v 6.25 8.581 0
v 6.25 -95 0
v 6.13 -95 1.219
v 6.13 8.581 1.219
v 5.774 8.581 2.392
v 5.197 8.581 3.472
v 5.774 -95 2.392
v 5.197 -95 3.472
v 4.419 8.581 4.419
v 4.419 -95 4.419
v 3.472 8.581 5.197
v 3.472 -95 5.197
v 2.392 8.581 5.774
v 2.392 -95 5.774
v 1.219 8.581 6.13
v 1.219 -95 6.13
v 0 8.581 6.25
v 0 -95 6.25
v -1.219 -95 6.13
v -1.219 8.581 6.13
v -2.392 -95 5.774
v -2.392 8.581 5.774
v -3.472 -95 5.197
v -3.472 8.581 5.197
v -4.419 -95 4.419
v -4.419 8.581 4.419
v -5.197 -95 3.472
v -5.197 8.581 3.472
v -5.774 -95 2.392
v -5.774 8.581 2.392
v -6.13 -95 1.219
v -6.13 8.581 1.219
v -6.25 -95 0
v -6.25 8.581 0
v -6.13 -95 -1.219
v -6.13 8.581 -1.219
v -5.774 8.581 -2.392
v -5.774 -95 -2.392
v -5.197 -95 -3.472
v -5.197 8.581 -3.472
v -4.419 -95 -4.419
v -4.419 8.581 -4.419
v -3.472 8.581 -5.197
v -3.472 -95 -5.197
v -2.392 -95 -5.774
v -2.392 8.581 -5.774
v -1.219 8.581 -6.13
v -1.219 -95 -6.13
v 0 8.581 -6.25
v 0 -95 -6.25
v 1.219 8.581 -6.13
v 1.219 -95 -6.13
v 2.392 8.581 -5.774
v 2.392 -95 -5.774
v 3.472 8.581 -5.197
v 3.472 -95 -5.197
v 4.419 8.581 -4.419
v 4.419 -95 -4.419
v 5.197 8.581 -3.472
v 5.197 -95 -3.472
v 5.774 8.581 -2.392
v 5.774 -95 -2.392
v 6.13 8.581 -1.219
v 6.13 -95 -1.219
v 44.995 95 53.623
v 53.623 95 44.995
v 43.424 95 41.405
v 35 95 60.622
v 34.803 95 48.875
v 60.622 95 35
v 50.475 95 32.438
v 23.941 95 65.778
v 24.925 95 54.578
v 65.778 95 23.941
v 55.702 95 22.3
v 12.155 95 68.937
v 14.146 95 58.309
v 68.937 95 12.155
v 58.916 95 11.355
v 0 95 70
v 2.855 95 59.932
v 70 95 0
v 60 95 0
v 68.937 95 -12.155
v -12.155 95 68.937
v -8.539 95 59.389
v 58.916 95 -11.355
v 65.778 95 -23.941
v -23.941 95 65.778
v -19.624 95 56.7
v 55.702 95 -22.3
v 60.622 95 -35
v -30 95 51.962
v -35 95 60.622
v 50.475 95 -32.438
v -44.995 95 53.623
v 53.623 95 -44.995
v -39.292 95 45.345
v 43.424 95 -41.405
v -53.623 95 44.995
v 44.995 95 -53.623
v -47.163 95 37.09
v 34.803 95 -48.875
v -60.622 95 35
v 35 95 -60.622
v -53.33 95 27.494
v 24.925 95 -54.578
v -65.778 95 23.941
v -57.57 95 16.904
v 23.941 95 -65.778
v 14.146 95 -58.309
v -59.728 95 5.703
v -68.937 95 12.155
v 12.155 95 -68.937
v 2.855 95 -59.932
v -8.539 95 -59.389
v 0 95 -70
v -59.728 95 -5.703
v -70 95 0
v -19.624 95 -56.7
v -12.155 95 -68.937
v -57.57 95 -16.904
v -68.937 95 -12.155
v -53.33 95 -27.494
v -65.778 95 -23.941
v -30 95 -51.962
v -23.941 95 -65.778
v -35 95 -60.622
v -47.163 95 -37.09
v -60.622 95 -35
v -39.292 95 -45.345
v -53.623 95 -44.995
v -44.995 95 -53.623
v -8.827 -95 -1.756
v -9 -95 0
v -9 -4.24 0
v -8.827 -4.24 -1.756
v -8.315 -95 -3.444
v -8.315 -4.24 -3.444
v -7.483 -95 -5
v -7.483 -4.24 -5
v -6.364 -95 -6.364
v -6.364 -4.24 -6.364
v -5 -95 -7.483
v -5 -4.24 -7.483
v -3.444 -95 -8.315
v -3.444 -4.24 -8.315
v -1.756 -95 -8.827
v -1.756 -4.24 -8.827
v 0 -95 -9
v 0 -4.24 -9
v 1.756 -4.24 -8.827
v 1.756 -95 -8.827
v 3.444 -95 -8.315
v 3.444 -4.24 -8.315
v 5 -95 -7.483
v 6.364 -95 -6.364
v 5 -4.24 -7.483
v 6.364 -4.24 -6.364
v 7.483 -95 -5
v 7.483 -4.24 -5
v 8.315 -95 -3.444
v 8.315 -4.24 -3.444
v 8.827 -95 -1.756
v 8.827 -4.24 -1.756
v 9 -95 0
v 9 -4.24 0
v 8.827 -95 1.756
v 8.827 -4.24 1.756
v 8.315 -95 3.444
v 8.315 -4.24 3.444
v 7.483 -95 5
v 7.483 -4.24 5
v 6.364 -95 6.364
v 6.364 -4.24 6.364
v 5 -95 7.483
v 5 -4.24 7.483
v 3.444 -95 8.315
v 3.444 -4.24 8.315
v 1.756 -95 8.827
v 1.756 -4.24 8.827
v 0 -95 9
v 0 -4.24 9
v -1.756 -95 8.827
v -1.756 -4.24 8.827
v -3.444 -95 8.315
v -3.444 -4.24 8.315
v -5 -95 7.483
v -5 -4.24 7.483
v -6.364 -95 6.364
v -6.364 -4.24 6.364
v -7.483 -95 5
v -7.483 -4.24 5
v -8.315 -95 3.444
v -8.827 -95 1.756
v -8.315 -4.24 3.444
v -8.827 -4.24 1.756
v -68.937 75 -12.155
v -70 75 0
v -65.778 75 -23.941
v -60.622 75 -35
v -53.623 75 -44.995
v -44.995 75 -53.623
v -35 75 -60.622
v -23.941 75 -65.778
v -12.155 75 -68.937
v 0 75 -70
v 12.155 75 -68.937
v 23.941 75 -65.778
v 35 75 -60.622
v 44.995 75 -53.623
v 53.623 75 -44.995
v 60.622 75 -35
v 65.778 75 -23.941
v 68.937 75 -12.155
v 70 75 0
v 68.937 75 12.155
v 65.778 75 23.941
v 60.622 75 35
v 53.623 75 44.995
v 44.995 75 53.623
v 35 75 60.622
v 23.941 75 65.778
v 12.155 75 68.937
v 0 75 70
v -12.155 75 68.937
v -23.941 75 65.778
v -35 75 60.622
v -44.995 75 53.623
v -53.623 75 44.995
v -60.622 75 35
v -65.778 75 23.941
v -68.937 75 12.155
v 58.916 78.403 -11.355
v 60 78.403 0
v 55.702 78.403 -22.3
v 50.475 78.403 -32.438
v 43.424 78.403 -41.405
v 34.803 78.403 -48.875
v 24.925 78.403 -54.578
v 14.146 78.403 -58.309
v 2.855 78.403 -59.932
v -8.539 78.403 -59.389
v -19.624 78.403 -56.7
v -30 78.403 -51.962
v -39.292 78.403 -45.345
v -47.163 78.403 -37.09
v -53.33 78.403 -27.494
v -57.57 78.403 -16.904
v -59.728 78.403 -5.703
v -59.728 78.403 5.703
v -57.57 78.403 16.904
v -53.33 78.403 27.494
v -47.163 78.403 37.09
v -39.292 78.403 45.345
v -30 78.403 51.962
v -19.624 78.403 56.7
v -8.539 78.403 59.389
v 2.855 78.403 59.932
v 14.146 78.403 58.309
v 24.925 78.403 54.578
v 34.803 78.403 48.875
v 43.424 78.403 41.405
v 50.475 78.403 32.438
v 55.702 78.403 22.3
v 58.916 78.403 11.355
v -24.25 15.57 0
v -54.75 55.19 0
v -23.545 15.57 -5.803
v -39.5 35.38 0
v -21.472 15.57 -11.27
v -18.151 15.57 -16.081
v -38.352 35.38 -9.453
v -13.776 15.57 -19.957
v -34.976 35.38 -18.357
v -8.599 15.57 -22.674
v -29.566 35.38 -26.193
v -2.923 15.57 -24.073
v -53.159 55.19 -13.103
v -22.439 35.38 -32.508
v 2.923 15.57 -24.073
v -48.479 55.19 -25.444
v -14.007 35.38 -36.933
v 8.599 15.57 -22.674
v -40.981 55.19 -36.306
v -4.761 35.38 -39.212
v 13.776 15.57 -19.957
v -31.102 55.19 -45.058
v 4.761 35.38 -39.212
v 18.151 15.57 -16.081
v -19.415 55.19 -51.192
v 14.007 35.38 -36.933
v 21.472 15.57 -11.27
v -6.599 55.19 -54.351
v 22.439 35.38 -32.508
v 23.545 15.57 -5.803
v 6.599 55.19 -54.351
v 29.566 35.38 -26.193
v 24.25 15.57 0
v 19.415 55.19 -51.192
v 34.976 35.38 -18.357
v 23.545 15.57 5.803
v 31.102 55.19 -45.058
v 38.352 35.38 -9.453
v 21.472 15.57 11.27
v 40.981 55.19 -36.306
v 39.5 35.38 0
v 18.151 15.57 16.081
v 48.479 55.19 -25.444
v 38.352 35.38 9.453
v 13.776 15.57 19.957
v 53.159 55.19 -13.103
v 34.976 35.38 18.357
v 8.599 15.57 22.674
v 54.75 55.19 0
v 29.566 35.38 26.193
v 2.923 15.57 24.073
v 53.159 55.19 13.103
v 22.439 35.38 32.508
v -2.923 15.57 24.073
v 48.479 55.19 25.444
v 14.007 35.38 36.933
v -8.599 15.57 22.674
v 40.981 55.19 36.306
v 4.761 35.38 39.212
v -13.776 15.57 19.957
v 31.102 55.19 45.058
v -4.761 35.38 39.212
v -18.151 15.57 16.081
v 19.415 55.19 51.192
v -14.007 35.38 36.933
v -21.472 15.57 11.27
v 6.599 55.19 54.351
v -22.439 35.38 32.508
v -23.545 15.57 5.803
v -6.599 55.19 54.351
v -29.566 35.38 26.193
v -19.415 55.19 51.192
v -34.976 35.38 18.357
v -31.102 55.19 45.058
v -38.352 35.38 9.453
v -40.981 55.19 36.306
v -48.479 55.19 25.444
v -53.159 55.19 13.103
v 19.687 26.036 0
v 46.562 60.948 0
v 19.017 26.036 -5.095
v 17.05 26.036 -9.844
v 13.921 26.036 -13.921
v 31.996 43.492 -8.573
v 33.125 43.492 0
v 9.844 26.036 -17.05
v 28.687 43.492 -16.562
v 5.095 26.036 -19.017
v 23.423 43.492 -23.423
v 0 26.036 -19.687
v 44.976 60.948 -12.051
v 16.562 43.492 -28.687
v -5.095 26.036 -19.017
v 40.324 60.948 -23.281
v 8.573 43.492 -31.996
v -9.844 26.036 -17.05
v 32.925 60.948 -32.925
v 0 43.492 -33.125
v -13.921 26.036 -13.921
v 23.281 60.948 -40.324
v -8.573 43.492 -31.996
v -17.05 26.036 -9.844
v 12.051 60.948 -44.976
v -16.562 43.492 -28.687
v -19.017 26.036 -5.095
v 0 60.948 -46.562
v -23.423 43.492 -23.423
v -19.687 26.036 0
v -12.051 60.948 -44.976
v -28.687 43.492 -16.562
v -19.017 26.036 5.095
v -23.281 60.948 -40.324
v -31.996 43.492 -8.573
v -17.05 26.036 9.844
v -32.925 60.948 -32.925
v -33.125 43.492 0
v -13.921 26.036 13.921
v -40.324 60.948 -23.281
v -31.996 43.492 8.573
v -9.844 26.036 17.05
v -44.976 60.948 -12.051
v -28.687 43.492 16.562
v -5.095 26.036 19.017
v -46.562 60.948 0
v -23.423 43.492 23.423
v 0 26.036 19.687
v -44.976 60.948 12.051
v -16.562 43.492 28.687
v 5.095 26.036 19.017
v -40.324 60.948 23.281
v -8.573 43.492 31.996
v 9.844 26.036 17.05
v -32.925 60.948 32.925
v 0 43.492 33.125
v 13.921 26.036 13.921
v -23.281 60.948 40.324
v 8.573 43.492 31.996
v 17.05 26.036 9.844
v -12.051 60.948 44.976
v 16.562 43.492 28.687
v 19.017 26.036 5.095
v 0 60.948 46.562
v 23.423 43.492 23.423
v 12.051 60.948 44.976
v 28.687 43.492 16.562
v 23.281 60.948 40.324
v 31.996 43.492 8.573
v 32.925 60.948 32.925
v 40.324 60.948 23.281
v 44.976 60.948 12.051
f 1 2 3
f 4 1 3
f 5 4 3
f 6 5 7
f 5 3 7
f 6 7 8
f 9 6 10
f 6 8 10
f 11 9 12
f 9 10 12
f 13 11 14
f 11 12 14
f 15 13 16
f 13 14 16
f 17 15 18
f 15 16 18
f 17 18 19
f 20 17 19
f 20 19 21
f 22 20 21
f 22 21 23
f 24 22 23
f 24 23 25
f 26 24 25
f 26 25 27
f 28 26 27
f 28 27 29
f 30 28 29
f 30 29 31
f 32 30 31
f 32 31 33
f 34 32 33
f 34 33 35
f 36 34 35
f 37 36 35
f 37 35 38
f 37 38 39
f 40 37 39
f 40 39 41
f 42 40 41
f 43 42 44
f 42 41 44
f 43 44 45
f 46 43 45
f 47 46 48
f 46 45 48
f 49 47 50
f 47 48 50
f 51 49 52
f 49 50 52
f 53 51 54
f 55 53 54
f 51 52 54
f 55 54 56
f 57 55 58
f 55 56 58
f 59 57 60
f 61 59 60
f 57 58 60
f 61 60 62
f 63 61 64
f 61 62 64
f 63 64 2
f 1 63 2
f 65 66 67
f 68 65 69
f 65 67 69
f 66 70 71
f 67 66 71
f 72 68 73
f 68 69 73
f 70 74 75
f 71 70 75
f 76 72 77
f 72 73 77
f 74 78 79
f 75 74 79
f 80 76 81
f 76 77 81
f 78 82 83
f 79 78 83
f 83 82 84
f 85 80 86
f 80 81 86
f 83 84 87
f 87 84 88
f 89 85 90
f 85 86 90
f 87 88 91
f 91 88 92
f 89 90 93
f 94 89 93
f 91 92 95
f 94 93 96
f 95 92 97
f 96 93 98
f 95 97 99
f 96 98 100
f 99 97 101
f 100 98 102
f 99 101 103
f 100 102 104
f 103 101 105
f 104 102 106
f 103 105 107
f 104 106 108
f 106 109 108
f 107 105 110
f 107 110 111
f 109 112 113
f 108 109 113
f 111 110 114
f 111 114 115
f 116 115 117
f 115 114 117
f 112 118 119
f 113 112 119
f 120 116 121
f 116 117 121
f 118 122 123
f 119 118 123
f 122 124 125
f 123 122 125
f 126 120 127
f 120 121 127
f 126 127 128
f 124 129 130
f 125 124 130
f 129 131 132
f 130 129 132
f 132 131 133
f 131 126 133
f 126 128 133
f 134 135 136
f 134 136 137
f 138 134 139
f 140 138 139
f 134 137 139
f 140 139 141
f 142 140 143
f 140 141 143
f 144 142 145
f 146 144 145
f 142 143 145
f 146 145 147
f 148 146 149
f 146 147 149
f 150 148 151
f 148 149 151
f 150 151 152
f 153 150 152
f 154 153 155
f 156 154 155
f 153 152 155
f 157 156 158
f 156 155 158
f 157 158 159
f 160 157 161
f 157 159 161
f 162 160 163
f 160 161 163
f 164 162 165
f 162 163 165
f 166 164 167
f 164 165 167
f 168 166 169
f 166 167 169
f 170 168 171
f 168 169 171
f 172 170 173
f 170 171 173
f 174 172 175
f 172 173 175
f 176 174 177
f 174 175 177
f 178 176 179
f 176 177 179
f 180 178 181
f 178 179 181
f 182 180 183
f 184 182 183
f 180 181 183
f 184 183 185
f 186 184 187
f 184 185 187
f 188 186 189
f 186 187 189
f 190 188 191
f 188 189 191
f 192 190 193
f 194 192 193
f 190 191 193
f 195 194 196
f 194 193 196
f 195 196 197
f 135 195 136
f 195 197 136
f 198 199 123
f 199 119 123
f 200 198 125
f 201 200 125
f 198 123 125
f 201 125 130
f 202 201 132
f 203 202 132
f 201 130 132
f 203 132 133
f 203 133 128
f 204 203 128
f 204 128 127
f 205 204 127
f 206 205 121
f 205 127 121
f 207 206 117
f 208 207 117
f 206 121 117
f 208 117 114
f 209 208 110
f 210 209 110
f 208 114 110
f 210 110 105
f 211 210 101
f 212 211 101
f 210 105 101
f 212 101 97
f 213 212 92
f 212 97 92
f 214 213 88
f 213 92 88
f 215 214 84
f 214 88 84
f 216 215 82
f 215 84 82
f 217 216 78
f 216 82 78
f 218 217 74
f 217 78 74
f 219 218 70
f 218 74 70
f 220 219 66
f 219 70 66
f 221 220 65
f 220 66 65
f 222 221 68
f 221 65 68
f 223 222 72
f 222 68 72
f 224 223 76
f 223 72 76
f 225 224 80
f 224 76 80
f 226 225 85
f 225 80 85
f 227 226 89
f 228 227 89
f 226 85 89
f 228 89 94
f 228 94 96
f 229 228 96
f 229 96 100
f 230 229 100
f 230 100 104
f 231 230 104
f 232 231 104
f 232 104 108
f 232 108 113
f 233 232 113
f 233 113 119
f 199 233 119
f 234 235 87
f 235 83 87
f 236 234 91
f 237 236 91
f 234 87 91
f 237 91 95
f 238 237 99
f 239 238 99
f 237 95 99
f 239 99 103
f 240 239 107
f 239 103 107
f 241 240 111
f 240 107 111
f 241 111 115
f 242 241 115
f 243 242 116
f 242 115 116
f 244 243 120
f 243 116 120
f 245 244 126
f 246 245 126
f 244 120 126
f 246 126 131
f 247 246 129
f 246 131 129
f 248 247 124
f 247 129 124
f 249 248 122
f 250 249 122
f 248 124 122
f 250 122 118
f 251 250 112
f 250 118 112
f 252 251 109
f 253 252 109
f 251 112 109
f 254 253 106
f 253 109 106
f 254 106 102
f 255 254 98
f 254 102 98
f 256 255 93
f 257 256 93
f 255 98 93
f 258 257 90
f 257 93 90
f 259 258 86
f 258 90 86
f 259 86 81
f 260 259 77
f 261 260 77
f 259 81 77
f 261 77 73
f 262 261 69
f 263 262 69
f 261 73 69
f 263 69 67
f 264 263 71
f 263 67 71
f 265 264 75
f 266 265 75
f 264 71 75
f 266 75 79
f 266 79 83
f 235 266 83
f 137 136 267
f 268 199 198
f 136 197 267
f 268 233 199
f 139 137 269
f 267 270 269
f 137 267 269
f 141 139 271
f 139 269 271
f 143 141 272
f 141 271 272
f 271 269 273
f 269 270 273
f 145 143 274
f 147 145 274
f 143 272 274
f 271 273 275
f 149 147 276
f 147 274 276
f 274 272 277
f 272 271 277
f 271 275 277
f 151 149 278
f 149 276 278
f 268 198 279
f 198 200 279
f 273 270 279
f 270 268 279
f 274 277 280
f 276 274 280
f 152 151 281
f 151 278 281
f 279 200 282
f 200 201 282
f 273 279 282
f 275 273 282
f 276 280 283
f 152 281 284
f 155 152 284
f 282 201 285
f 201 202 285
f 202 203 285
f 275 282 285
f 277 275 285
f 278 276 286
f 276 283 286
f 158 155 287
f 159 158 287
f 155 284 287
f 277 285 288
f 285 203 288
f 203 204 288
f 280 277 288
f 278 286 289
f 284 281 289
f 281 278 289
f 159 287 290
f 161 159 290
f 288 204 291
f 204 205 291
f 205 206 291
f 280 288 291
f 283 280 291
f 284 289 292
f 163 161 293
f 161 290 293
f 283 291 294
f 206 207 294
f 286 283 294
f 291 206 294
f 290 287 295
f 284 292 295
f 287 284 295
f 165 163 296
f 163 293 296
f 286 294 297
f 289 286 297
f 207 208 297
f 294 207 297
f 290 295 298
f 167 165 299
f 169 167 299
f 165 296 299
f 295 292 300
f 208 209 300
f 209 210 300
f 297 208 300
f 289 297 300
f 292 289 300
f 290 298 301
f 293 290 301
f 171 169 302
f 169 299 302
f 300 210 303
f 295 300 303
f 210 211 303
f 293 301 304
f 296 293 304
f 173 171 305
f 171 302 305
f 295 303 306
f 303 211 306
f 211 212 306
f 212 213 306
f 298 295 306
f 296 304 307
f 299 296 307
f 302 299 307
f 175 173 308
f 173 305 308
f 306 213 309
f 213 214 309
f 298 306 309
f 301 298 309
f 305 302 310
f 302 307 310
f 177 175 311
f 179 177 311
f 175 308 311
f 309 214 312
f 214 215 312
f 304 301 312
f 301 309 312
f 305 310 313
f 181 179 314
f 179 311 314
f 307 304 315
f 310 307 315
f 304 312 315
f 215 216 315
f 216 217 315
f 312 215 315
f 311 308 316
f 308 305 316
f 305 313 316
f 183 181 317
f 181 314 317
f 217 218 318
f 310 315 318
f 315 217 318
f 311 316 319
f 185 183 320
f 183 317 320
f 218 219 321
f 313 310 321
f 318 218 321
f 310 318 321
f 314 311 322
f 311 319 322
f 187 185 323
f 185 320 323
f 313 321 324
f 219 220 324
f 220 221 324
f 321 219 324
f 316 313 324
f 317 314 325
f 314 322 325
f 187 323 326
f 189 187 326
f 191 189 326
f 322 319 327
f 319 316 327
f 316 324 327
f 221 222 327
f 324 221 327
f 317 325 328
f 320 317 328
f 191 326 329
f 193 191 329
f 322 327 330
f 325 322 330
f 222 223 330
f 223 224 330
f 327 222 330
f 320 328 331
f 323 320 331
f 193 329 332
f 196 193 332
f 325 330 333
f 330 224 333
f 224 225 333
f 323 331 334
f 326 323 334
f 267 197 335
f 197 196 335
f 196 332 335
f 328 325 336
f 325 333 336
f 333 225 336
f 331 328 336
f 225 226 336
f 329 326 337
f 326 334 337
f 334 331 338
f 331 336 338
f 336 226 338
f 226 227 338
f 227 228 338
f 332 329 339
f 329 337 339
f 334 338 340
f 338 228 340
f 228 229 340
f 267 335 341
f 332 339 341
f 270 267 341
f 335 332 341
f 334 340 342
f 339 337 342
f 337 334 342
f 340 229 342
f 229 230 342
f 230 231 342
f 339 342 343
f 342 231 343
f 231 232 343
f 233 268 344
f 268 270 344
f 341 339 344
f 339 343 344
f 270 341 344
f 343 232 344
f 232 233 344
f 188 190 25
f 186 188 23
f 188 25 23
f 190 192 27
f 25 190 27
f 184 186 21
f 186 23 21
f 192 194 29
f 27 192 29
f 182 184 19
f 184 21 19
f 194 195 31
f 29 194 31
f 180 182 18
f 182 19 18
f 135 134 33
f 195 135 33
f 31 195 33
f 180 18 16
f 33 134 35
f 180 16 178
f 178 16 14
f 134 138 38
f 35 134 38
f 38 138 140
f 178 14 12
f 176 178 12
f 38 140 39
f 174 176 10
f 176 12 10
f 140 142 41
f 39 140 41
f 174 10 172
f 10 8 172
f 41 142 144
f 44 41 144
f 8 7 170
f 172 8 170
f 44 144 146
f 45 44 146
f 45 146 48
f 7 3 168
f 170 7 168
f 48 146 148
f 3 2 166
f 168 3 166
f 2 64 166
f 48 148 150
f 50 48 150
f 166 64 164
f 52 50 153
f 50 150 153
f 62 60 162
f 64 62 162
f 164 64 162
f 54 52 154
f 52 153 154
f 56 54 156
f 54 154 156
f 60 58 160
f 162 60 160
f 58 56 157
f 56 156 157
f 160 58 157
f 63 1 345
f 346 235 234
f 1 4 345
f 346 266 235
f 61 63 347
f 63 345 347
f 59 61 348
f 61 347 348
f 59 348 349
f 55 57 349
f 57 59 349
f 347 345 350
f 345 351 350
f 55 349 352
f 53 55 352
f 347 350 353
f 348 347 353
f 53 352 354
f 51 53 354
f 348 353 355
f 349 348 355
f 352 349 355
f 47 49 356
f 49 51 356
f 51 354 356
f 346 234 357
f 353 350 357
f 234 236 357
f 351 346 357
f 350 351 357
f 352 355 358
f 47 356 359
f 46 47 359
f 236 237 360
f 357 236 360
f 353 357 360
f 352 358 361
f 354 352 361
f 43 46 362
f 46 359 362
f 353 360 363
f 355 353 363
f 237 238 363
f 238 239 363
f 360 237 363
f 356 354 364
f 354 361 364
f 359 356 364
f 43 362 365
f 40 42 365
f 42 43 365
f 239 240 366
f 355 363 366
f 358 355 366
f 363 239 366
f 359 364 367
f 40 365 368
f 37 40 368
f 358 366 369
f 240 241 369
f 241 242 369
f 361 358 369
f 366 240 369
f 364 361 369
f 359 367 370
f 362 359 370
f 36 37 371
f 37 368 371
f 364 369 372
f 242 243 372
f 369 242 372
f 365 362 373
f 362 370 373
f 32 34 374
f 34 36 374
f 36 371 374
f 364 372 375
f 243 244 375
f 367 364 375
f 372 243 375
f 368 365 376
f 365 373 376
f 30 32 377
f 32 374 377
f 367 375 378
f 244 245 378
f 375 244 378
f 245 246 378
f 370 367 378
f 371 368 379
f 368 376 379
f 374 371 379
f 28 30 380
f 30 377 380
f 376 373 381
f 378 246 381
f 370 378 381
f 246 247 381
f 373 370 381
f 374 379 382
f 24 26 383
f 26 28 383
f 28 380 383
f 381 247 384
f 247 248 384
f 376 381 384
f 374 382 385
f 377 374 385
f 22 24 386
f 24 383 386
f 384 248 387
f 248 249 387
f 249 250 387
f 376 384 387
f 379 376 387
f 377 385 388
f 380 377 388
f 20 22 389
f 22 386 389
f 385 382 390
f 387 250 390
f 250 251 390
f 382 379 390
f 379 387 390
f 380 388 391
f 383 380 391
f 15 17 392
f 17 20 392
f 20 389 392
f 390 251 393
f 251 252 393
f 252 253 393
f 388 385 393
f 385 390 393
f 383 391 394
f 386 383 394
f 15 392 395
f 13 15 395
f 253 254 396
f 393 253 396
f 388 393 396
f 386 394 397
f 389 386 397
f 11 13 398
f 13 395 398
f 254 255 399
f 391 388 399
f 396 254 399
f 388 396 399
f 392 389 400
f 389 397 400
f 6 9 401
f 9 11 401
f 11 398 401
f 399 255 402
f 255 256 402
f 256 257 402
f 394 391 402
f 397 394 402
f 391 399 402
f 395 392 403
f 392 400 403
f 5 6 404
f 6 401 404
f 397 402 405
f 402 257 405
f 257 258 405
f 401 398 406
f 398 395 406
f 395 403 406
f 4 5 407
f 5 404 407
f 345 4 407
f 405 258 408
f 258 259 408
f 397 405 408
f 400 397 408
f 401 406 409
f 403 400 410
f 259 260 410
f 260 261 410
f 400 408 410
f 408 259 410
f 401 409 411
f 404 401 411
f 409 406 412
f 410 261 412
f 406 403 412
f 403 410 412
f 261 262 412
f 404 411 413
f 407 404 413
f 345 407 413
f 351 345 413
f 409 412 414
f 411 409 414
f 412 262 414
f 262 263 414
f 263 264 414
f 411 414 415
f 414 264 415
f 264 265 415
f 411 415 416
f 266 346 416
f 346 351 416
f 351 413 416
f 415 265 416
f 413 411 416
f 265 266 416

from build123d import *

# Parameters (mm, degrees)
CROQUIS2_R            = 6.249824167
CORTAR_EXTRUIR1_DEPTH = 150


# Read off the part's stored shape, not the designer's step: Vaciado4
with BuildPart() as part:
    # Croquis1 → Revolución2 (revolve)
    with BuildSketch(Plane.XY, mode=Mode.PRIVATE) as revoluci_n2_sk:
        Polygon((0, 95), (0, -95), (9, -95), (9, -4.240141343), (70, 75), (70, 95), align=None)
    revolve(revoluci_n2_sk.sketch.rotate(Axis((0, 95, 0), (0, -1, 0)), 180), axis=Axis((0, 95, 0), (0, -1, 0)))

    # Vaciado4 outline → Vaciado4 (revolve, cut)
    with BuildSketch(Plane.XY):
        Polygon((0, 95), (0, 0.462132886), (60, 78.403255518), (60, 95), align=None)
    revolve(axis=Axis((0, 0, 0), (0, 1, 0)), mode=Mode.SUBTRACT)

    # Croquis2 → Cortar-Extruir1 (cut)
    with BuildSketch(Plane.XZ.offset(95)):
        Circle(CROQUIS2_R)
    extrude(amount=-CORTAR_EXTRUIR1_DEPTH, mode=Mode.SUBTRACT)


solid = part.part
